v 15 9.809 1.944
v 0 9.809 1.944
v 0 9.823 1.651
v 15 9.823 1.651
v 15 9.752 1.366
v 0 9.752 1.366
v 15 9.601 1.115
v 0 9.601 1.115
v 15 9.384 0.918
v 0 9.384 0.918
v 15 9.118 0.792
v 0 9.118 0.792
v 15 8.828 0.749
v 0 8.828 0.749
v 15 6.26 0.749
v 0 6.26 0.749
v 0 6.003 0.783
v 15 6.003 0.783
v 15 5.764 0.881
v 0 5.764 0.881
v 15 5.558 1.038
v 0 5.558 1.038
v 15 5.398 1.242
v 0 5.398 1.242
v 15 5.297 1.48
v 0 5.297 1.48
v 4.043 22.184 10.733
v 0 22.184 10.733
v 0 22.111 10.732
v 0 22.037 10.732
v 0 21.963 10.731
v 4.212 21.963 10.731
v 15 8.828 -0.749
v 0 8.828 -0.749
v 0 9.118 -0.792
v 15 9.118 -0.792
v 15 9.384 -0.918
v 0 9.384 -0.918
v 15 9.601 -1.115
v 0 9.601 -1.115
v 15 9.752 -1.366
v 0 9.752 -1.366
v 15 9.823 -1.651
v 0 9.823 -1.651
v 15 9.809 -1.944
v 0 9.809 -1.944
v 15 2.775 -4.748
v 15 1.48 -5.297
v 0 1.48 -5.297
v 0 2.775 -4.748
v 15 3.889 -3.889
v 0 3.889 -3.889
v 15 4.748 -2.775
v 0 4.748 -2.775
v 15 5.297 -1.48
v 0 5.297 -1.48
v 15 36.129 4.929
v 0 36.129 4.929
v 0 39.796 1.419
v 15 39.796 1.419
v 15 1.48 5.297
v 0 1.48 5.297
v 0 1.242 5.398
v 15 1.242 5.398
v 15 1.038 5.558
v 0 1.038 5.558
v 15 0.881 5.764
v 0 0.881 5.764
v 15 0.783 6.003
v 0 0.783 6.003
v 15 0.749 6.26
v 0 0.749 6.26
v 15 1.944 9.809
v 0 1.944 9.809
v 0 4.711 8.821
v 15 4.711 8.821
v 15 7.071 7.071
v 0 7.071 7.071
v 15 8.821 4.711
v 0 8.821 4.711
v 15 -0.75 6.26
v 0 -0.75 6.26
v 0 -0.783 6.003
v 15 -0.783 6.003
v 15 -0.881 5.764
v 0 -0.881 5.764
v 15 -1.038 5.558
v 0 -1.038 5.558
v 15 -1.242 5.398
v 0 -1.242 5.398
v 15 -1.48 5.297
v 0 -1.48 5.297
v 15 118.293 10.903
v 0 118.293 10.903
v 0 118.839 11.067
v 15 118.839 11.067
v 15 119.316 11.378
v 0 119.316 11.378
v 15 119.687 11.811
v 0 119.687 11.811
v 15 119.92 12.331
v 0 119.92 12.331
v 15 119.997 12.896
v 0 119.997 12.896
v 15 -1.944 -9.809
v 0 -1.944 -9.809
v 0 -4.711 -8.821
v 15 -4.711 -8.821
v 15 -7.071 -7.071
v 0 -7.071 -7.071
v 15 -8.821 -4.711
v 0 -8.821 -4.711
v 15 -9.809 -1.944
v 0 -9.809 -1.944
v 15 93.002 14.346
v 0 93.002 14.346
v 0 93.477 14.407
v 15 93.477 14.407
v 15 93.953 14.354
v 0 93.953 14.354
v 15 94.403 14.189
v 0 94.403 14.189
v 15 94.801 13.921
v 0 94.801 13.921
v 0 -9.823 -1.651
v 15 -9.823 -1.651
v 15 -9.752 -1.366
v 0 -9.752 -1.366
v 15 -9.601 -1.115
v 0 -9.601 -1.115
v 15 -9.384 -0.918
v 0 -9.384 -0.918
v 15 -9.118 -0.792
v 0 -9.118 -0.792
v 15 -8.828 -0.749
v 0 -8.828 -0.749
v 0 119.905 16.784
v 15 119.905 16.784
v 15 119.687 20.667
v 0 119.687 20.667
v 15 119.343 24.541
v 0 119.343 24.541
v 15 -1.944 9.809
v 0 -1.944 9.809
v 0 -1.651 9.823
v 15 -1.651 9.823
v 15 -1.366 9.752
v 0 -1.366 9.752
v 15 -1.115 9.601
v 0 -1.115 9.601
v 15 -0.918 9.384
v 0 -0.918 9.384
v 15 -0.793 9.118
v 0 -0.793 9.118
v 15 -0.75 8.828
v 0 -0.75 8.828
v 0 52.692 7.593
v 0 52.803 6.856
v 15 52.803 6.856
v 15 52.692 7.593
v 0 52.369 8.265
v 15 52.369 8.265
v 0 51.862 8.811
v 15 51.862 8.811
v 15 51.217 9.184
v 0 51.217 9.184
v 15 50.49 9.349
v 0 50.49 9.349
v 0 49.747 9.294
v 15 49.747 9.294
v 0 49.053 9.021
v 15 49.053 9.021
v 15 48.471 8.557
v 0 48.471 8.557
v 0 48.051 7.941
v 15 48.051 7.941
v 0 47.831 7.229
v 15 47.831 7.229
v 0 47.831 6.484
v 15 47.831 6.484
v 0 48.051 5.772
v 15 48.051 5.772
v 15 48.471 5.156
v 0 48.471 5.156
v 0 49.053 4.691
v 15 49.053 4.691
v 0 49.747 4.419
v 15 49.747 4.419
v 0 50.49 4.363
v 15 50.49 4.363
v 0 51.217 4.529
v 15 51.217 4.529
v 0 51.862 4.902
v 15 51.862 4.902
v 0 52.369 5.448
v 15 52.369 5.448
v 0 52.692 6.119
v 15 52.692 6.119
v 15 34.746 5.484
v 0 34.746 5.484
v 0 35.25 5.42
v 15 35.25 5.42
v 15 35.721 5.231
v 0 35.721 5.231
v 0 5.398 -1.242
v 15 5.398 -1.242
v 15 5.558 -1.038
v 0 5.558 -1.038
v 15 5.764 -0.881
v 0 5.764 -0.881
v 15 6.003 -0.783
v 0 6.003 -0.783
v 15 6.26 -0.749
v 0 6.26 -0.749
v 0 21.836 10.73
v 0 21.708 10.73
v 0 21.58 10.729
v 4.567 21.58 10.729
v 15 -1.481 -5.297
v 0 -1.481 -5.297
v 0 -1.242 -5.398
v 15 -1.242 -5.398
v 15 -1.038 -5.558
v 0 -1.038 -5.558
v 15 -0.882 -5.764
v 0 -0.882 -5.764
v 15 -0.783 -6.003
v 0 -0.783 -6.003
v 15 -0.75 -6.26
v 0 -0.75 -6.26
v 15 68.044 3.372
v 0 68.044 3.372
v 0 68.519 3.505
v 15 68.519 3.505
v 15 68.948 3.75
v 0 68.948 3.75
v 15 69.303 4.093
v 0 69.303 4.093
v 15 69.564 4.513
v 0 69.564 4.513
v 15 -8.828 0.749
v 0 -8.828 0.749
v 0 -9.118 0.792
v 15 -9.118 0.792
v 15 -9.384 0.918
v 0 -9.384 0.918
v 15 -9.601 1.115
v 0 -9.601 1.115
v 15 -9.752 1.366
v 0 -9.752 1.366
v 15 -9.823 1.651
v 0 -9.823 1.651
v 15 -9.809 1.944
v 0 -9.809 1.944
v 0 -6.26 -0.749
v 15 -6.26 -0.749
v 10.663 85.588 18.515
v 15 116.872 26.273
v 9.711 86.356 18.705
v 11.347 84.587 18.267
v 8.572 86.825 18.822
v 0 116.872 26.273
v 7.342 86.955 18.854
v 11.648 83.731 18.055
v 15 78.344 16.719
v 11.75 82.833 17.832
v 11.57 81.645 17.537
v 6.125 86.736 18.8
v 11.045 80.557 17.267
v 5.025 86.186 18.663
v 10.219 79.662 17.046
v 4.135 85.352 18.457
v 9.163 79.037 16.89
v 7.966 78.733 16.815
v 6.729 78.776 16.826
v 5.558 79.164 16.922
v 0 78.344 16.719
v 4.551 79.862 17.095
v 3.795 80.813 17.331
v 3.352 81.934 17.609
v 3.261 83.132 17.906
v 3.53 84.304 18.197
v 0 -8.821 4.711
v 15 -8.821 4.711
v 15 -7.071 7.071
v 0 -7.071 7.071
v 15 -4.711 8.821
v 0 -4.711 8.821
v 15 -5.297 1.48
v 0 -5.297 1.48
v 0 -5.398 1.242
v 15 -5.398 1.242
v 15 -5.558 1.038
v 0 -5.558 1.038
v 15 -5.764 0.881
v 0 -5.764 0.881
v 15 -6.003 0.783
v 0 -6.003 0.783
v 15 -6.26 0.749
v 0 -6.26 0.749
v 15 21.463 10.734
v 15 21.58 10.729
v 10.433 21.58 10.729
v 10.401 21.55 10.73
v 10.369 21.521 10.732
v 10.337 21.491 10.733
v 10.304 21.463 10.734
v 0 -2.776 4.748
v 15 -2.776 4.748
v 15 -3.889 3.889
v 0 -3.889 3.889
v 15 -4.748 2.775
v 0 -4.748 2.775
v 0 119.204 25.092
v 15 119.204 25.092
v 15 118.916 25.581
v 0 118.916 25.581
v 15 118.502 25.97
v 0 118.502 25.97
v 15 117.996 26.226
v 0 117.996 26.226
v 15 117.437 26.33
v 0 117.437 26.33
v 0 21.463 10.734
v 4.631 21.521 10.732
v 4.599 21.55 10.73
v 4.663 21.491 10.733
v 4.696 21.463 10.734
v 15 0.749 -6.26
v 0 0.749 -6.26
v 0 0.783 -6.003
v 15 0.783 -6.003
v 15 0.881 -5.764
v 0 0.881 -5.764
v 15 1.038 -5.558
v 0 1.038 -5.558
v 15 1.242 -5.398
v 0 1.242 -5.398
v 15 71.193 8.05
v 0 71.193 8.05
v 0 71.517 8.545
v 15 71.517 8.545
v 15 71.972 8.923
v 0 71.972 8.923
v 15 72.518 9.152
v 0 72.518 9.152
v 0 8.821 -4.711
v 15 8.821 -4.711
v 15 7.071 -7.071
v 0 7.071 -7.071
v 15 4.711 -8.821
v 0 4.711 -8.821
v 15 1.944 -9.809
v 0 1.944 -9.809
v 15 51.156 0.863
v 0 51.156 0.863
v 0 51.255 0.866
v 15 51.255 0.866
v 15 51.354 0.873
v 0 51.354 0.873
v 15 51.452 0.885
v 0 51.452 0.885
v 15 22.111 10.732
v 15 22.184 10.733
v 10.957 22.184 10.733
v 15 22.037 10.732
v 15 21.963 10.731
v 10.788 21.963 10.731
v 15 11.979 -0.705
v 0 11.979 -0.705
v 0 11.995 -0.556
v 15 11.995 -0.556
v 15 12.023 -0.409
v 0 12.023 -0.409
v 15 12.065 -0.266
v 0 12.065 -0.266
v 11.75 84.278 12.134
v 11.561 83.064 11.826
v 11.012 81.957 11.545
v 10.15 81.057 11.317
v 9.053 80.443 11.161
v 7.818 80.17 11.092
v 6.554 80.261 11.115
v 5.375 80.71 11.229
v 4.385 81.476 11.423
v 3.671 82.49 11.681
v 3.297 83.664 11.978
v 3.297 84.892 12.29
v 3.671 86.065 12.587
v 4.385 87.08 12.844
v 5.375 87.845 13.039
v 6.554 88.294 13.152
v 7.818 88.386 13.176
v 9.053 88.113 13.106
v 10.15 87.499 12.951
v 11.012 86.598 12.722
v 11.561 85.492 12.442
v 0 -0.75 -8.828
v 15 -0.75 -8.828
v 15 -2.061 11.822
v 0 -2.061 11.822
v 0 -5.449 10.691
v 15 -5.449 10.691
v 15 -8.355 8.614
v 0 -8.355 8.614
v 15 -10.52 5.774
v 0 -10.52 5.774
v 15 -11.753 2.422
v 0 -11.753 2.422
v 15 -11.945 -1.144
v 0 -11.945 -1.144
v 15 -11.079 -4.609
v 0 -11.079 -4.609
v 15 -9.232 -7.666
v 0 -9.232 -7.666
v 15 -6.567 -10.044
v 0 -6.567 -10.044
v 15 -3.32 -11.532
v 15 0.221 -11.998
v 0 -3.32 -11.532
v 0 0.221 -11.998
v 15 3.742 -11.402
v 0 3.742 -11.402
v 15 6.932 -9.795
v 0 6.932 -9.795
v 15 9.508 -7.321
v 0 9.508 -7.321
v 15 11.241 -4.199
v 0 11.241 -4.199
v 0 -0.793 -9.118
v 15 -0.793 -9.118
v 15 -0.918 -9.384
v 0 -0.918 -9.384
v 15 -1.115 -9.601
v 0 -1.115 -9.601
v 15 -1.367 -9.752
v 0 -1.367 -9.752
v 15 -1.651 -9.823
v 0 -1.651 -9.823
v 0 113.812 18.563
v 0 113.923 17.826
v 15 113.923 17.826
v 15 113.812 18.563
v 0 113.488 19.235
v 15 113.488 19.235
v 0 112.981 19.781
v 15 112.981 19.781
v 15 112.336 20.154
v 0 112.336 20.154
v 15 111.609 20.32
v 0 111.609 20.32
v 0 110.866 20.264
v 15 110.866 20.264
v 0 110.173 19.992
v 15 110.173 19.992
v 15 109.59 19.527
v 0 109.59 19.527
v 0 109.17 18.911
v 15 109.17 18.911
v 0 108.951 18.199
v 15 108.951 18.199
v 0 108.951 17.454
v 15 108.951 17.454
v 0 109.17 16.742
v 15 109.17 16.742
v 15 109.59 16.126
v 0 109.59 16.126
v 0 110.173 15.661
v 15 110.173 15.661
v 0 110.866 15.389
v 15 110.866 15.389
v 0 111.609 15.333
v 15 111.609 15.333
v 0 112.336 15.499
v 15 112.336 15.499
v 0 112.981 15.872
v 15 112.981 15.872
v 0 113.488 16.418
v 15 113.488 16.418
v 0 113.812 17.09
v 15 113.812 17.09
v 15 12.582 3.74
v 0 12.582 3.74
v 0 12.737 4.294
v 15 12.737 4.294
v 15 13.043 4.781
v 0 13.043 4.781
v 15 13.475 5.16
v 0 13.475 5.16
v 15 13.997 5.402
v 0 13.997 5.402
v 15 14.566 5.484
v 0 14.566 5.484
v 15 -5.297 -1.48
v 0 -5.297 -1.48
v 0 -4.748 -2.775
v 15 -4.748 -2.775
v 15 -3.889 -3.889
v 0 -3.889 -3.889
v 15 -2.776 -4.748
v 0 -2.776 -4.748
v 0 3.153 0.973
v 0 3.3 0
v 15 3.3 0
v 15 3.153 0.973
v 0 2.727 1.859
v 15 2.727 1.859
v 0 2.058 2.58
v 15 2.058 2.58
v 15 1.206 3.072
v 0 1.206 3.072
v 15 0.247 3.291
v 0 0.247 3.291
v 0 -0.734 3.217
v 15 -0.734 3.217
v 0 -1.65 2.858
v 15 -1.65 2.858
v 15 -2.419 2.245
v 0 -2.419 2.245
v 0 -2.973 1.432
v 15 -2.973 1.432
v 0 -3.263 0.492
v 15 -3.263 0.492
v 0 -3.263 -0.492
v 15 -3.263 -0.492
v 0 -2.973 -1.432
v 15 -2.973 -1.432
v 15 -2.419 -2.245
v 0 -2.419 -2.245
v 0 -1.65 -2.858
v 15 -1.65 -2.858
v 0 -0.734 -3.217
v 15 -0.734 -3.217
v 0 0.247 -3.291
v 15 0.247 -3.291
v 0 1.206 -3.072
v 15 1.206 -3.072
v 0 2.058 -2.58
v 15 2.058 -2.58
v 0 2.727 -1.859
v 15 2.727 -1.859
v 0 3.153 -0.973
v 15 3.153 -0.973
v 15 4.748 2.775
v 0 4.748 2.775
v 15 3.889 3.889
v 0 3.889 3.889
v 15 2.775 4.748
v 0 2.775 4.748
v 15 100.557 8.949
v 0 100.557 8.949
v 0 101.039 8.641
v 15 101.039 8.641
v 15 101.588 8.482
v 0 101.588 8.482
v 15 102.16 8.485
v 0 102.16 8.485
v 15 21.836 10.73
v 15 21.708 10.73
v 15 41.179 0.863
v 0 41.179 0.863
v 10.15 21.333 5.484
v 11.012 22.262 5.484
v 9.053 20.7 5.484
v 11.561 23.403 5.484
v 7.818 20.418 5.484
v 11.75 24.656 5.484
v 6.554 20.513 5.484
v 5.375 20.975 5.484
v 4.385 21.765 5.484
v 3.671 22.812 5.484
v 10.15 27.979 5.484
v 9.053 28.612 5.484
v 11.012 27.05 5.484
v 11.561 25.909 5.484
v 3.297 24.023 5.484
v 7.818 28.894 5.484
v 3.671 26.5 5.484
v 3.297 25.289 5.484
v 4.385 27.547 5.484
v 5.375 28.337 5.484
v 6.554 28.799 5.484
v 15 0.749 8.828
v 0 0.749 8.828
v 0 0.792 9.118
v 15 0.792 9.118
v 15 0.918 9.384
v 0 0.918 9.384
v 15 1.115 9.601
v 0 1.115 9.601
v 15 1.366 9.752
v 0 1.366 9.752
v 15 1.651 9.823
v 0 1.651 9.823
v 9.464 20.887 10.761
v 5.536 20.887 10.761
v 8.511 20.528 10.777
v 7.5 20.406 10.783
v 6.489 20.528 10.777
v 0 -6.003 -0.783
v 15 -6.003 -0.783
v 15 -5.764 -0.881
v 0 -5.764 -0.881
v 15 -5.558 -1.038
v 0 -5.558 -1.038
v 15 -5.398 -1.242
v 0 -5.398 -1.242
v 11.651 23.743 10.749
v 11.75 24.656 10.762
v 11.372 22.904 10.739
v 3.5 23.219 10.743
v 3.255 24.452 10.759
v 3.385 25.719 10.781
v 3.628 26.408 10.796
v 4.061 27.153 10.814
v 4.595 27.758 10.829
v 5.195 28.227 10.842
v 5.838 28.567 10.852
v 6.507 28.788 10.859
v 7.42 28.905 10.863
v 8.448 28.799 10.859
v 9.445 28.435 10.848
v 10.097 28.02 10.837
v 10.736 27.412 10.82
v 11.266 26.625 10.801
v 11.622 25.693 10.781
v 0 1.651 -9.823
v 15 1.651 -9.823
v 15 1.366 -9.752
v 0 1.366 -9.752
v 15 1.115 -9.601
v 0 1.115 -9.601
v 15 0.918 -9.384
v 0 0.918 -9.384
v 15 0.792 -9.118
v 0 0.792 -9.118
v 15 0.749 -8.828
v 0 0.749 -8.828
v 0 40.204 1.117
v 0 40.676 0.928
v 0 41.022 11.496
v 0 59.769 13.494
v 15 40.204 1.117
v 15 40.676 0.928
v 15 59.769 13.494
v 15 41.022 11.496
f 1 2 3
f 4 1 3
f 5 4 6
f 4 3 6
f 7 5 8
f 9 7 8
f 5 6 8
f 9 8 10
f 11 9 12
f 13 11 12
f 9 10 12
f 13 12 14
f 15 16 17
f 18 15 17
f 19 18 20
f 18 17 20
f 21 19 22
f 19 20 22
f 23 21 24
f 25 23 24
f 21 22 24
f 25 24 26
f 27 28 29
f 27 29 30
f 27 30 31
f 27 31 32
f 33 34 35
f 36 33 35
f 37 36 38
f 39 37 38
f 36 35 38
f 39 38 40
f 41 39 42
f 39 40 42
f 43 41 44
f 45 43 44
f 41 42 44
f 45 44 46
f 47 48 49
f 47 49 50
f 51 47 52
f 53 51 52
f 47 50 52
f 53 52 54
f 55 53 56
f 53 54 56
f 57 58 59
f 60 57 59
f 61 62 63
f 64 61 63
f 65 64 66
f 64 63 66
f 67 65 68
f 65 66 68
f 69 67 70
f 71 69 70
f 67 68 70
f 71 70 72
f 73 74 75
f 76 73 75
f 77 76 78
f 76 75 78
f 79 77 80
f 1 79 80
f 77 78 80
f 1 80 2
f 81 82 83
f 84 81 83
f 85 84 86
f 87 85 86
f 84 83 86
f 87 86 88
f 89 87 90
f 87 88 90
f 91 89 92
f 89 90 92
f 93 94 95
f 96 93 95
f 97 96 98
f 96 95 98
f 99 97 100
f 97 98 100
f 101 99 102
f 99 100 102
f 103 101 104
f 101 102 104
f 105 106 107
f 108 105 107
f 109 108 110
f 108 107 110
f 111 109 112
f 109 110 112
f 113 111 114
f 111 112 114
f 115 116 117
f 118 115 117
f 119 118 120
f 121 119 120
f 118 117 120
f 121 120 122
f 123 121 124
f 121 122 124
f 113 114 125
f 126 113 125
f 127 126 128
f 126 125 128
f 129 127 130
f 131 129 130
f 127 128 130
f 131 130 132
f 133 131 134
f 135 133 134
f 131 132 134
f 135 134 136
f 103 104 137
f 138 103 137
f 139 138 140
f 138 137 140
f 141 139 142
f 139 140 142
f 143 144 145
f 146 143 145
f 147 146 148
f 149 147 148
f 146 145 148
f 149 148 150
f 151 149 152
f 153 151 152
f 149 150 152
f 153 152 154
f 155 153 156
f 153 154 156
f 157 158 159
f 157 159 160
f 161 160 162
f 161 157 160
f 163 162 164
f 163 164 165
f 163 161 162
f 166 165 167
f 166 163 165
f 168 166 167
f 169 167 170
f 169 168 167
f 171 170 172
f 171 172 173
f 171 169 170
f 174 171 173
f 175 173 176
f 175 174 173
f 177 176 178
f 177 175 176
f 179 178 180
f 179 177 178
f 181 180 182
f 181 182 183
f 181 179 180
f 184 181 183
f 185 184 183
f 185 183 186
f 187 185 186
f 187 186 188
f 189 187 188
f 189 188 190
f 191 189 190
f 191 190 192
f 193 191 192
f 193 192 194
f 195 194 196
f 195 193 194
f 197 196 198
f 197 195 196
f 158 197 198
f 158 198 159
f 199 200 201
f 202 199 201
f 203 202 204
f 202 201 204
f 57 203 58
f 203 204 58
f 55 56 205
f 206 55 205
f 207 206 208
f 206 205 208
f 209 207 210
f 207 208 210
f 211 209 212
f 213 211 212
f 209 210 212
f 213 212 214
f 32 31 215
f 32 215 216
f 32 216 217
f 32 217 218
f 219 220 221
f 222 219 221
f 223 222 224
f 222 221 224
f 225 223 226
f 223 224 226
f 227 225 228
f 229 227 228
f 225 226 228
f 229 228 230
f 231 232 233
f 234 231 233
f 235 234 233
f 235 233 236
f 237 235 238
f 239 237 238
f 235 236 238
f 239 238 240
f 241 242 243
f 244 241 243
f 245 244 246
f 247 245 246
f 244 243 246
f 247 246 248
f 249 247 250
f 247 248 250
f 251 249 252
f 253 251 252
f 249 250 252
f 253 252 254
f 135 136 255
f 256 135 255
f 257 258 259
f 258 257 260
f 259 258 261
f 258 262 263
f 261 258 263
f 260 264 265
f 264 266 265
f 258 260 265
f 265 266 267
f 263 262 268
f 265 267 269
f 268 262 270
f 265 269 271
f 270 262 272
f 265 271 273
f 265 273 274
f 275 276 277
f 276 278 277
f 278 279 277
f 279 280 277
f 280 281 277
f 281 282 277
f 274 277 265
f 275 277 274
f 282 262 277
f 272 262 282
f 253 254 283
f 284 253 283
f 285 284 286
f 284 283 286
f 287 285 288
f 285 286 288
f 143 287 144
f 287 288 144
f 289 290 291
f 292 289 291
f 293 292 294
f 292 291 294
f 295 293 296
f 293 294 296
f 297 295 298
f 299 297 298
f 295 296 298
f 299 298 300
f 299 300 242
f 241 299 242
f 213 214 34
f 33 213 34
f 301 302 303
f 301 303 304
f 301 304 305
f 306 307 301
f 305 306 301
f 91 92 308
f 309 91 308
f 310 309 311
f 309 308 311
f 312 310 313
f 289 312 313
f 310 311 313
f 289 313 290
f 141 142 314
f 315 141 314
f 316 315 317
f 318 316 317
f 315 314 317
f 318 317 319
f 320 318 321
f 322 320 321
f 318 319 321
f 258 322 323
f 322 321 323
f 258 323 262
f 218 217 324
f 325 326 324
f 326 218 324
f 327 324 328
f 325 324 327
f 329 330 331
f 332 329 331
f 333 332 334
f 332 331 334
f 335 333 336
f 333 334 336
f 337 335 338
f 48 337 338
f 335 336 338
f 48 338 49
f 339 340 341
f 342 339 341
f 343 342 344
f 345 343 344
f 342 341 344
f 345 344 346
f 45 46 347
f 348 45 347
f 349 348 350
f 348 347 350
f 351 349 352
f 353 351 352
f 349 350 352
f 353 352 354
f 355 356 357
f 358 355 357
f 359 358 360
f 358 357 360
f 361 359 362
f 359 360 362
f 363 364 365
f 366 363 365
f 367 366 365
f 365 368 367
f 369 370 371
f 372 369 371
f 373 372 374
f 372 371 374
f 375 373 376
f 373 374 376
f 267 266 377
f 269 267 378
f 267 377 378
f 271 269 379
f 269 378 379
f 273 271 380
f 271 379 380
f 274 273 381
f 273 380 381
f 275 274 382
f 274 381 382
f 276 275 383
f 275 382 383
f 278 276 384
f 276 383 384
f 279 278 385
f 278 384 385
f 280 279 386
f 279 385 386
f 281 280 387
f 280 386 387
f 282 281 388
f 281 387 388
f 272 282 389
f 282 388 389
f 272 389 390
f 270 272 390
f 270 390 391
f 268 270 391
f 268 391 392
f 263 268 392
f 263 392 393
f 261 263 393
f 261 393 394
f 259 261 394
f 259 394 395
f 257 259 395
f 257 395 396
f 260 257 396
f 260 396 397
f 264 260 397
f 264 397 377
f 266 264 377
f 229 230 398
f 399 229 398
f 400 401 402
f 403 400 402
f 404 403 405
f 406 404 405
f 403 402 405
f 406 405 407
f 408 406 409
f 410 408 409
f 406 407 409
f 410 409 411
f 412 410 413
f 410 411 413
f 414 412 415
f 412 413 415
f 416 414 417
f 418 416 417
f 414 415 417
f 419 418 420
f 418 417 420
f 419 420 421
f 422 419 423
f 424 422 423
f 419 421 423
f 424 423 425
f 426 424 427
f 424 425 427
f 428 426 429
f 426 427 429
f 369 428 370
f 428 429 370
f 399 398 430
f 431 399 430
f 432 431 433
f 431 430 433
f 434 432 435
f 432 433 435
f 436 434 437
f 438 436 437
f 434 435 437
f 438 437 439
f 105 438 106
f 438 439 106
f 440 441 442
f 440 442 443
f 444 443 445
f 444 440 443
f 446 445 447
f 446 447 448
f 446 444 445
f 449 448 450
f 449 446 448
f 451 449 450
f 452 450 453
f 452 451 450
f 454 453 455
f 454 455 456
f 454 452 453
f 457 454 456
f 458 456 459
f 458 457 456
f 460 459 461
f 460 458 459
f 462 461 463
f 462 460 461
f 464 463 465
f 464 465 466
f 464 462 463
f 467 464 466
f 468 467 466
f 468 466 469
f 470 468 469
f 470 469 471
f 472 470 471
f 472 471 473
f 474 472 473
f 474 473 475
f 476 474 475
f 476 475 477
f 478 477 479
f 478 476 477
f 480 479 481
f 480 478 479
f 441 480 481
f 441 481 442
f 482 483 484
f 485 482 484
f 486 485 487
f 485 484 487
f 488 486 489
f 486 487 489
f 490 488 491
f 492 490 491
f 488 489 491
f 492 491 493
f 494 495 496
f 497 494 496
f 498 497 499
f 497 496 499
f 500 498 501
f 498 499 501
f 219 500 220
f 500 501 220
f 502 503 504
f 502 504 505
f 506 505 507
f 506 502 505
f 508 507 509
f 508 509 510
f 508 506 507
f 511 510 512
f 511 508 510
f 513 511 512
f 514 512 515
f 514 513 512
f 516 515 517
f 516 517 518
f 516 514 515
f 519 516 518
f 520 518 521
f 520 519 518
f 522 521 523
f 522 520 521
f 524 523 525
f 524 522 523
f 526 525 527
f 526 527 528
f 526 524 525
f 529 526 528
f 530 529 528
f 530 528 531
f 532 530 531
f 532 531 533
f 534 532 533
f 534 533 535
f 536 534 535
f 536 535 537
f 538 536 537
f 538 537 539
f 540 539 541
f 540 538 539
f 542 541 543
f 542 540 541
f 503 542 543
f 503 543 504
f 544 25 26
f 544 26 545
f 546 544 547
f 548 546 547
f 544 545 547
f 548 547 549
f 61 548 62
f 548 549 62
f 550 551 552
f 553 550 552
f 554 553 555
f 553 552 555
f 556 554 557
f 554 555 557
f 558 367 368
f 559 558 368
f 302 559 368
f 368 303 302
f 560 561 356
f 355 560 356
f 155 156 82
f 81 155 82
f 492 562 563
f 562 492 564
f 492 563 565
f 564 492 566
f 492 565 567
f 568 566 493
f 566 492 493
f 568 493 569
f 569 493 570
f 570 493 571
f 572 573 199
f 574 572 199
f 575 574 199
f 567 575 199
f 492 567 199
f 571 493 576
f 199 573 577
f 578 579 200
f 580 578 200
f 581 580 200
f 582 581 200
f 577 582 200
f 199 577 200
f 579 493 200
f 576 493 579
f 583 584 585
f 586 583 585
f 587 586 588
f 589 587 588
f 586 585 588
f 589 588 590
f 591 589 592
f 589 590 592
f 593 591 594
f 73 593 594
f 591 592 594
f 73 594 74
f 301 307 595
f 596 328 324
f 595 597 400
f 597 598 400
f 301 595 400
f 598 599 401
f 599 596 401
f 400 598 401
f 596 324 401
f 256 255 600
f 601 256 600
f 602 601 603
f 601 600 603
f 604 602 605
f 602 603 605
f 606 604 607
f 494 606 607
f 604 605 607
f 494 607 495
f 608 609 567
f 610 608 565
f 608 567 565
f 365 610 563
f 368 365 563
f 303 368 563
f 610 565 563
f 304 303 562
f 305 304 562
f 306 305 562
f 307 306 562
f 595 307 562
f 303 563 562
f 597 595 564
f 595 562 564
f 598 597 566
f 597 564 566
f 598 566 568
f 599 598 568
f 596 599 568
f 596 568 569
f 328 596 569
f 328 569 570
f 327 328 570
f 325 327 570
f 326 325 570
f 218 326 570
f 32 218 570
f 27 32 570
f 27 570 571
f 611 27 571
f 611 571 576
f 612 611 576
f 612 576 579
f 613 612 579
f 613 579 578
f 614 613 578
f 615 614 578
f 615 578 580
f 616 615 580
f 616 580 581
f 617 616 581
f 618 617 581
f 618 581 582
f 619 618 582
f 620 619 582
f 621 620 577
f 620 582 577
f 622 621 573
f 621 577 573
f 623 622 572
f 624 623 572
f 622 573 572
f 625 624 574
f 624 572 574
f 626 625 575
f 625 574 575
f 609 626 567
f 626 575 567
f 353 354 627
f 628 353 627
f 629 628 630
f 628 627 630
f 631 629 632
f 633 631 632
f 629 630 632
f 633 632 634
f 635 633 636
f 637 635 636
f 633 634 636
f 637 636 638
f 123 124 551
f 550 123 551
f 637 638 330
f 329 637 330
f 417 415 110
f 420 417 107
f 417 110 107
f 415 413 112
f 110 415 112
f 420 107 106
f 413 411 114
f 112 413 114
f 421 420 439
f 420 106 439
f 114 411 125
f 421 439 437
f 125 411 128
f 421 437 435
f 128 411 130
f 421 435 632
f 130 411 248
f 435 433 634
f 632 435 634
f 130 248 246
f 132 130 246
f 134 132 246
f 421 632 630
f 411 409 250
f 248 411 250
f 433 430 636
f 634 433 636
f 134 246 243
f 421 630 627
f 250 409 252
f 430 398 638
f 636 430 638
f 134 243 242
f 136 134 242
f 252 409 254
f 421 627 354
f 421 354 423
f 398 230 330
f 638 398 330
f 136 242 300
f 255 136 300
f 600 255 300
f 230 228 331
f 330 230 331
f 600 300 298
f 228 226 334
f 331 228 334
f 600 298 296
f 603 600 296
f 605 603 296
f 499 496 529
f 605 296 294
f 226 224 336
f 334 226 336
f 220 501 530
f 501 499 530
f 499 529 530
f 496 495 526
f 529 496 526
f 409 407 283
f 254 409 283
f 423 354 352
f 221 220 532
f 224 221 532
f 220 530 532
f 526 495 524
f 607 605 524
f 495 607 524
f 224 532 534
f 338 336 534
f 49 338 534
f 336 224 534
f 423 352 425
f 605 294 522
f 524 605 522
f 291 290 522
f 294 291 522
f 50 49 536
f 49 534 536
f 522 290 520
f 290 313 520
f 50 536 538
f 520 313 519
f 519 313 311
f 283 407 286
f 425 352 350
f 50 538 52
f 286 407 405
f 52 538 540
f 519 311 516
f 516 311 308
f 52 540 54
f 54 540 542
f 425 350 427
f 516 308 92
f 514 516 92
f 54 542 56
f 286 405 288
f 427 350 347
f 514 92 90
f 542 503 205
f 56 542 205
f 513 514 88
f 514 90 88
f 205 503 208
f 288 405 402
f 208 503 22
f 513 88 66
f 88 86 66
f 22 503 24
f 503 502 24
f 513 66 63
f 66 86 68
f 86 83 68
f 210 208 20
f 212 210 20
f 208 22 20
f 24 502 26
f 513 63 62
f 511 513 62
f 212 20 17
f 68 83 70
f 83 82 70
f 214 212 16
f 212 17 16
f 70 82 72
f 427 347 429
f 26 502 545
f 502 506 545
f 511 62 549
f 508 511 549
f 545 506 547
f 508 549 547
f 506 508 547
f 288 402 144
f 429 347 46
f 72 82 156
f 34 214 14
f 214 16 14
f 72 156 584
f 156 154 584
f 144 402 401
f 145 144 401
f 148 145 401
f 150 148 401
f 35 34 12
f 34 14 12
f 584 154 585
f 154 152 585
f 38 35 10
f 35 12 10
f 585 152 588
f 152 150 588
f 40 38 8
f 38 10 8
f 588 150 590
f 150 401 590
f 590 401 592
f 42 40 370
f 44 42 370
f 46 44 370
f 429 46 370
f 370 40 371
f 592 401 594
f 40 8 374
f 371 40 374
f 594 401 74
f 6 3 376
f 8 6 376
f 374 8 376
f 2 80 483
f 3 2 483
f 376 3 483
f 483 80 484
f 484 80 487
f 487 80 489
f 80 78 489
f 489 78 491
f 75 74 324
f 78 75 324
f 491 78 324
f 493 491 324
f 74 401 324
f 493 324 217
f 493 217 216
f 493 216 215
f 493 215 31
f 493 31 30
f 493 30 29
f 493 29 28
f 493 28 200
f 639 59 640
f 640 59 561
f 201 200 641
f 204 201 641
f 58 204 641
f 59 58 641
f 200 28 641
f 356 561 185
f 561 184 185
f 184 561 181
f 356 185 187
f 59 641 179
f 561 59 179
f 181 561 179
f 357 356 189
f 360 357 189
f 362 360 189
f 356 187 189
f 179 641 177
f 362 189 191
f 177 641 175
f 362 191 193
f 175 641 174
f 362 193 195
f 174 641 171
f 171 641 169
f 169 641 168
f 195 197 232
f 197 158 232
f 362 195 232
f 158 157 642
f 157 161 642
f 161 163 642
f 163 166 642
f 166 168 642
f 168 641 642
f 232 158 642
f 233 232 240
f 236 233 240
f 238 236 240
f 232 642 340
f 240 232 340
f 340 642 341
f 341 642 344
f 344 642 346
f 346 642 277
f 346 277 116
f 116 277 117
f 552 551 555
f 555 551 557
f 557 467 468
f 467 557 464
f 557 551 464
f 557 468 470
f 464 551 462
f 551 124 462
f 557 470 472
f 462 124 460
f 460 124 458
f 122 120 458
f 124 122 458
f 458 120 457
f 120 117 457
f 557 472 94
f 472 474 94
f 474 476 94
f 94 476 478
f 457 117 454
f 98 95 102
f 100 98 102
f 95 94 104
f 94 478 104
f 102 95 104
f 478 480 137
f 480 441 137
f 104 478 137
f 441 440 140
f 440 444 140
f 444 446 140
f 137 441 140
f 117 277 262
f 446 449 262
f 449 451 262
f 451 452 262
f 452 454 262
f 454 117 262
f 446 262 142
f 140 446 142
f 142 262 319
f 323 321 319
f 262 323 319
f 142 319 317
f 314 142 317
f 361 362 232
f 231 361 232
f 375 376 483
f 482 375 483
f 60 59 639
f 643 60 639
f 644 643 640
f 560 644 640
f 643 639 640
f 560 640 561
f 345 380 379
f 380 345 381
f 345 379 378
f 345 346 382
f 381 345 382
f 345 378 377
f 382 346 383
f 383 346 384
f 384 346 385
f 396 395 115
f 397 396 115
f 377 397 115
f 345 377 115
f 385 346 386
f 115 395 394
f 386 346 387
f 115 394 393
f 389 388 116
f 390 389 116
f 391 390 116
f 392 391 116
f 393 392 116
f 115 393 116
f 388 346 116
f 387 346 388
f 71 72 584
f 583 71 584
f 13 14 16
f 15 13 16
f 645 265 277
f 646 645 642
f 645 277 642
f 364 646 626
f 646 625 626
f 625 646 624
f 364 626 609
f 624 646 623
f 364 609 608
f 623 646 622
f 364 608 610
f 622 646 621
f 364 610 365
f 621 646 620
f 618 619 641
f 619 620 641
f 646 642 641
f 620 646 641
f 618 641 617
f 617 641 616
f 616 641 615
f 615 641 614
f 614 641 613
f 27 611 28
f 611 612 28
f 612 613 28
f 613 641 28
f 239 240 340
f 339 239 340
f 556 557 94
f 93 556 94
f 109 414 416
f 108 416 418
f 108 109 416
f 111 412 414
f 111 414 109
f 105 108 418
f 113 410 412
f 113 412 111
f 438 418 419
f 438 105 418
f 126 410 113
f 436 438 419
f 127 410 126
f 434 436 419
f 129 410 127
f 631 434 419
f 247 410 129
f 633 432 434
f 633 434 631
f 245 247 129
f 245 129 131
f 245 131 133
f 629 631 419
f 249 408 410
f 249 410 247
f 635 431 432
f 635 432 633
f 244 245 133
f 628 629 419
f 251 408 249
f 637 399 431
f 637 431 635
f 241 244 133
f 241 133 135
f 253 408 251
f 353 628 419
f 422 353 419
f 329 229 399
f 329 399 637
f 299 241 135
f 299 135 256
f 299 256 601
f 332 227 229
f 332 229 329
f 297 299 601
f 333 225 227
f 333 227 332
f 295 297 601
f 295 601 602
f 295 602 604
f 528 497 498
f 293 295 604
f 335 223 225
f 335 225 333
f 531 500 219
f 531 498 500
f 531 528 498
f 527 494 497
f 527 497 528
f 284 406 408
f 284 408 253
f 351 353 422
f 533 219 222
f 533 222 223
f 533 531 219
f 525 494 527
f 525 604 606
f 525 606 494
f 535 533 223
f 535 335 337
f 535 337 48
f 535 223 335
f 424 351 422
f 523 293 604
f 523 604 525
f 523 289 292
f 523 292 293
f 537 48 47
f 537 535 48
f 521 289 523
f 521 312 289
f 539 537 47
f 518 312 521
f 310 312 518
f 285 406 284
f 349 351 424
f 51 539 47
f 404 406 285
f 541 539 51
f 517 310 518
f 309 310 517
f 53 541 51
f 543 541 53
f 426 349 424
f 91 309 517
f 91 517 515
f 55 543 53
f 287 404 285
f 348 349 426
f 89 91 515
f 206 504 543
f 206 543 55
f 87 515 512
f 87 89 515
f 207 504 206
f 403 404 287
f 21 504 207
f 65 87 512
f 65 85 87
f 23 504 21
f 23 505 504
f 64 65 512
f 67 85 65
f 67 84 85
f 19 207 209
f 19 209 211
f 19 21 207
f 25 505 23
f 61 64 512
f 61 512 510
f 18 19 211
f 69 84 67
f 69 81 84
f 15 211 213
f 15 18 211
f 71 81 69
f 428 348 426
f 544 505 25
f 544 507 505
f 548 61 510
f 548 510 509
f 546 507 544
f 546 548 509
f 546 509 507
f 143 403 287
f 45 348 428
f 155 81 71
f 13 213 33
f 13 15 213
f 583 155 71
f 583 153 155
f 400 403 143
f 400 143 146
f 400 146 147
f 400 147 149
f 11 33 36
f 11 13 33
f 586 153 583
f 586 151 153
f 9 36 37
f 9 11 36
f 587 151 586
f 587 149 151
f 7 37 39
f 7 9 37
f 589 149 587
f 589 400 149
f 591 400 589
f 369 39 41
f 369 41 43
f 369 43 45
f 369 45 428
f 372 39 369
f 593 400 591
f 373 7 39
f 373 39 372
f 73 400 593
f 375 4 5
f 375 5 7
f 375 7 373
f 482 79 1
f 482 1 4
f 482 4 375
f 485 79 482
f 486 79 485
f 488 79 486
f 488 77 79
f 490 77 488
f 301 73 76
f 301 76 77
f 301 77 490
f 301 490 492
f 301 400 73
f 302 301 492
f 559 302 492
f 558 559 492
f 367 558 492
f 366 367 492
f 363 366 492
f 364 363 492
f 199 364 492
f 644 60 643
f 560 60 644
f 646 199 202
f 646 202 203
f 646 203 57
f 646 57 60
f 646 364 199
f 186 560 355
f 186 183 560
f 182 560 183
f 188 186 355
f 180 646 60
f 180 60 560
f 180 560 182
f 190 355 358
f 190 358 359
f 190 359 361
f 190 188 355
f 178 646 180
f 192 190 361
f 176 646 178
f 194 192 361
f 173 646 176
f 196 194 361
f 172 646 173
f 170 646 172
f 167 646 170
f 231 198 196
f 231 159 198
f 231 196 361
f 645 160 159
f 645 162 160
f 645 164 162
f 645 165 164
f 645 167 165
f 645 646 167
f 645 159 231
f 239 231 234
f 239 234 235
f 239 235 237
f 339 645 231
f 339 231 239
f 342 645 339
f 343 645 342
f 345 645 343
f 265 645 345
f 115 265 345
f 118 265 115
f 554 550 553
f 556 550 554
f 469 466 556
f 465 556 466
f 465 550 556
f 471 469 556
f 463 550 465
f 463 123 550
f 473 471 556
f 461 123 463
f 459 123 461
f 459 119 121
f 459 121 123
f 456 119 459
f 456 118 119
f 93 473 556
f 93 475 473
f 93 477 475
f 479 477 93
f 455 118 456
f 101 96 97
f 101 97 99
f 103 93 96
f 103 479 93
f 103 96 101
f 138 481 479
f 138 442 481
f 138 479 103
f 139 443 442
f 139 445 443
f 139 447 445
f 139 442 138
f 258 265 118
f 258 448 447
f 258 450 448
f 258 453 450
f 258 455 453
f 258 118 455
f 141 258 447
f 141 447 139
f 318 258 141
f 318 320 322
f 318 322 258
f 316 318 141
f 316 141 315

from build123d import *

# Parameters (mm, degrees)
F0_R     = 3.3
F0_R_2   = 2.5
F1_DEPTH = 15
F2_R     = 4.25
F3_DEPTH = 7.6
F4_R     = 4.25
F5_DEPTH = 15.8


# Not quite as in the source:
# - a feature names something its author has since deleted; it is built from what else it names


with BuildPart() as f1:
    # F0 (on Right) → F1 (new body)
    with BuildSketch(Plane.YZ):
        with BuildLine():
            ThreePointArc((21.8315579223, 10.717182122), (21.897134346, 10.7177196915), (21.9626931438, 10.7193322557))
            ThreePointArc((21.9626931438, 10.7193322557), (21.9630378123, 10.7252568669), (21.9633808826, 10.731181571))
            ThreePointArc((21.9633808826, 10.731181571), (21.7716697335, 10.7299327404), (21.5799577929, 10.728811993))
            Line((21.5799577929, 10.728811993), (21.8315579223, 10.717182122))
        make_face()
        with BuildLine():
            ThreePointArc((22.1844688263, 10.7327808001), (22.0736743793, 10.7245163933), (21.9626931438, 10.7193322557))
            ThreePointArc((21.9626931438, 10.7193322557), (21.897134346, 10.7177196915), (21.8315579223, 10.717182122))
            ThreePointArc((21.8315579223, 10.717182122), (21.6468606164, 10.7214485341), (21.4625573078, 10.7342386694))
            Line((21.4625573078, 10.7342386694), (-2.0614712889, 11.8216046341))
            ThreePointArc((-2.0614712889, 11.8216046341), (-7.9885695505, -8.9544824829), (11.9792964571, -0.7045966171))
            ThreePointArc((11.9792964571, -0.7045966171), (12.0074816864, -0.4822378377), (12.0652655082, -0.2656763826))
            Line((12.0652655082, -0.2656763826), (12.5823545671, 3.7402298466))
            ThreePointArc((12.5823545671, 3.7402298466), (13.2453067327, 4.9862024463), (14.565897859, 5.4841907695))
            Line((14.565897859, 5.4841907695), (34.746018001, 5.4841907695))
            ThreePointArc((34.746018001, 5.4841907695), (35.4911723527, 5.3401931919), (36.1290262829, 4.9289357615))
            Line((36.1290262829, 4.9289357615), (39.7961525429, 1.4185128035))
            ThreePointArc((39.7961525429, 1.4185128035), (40.4340064731, 1.0072553731), (41.1791608249, 0.8632577956))
            Line((41.1791608249, 0.8632577956), (51.1560065331, 0.8632577956))
            ThreePointArc((51.1560065331, 0.8632577956), (51.3046360431, 0.8687881245), (51.452443583, 0.8853485268))
            Line((51.452443583, 0.8853485268), (68.043755982, 3.3719538424))
            ThreePointArc((68.043755982, 3.3719538424), (68.9480745213, 3.750430082), (69.5639006382, 4.5131846154))
            Line((69.5639006382, 4.5131846154), (71.1927053136, 8.0496168184))
            ThreePointArc((71.1927053136, 8.0496168184), (71.7304115705, 8.7506241115), (72.5176709464, 9.151575379))
            Line((72.5176709464, 9.151575379), (93.0016589096, 14.3460792675))
            ThreePointArc((93.0016589096, 14.3460792675), (93.9531599103, 14.3538506609), (94.800564285, 13.9210454222))
            Line((94.800564285, 13.9210454222), (100.5567479715, 8.9494668086))
            ThreePointArc((100.5567479715, 8.9494668086), (101.3078443235, 8.5419637232), (102.1604743235, 8.4851607509))
            Line((102.1604743235, 8.4851607509), (118.2931486533, 10.9030281733))
            ThreePointArc((118.2931486533, 10.9030281733), (119.516973098, 11.5813971433), (119.9966558679, 12.8958685851))
            ThreePointArc((119.9966558679, 12.8958685851), (119.8113324935, 18.7264110882), (119.3428752162, 24.5410579746))
            ThreePointArc((119.3428752162, 24.5410579746), (118.5020303548, 25.9696085801), (116.872434029, 26.2732411356))
            Line((116.872434029, 26.2732411356), (78.344444671, 16.7187866332))
            ThreePointArc((78.344444671, 16.7187866332), (50.4120849121, 12.3407543123), (22.1844688263, 10.7327808001))
        make_face()
        with BuildLine():
            ThreePointArc((-9.8092514957, -1.9438583008), (-9.6011089256, -1.114801623), (-8.8283263462, -0.7494724707))
            Line((-8.8283263462, -0.7494724707), (-6.2601394612, -0.7494724707))
            ThreePointArc((-6.2601394612, -0.7494724707), (-5.6556353715, -0.9528704337), (-5.2970410826, -1.4803228598))
            ThreePointArc((-5.2970410826, -1.4803228598), (-3.8892204731, -3.8889541154), (-1.4806856428, -5.2969396851))
            ThreePointArc((-1.4806856428, -5.2969396851), (-0.9532704937, -5.6555533383), (-0.7499012145, -6.2600460414))
            Line((-0.7499012145, -6.2600460414), (-0.7499690502, -8.8282543402))
            ThreePointArc((-0.7499690502, -8.8282543402), (-1.1153301427, -9.6010367371), (-1.9444100554, -9.8091421407))
            ThreePointArc((-1.9444100554, -9.8091421407), (-7.0712666783, -7.0708689399), (-9.8092514957, -1.9438583008))
        make_face(mode=Mode.SUBTRACT)
        with BuildLine():
            ThreePointArc((9.8092514957, -1.9438583008), (7.0710678119, -7.0710678119), (1.9438583008, -9.8092514957))
            ThreePointArc((1.9438583008, -9.8092514957), (1.114801623, -9.6011089256), (0.7494724707, -8.8283263462))
            Line((0.7494724707, -8.8283263462), (0.7494724707, -6.2601394612))
            ThreePointArc((0.7494724707, -6.2601394612), (0.9528704337, -5.6556353715), (1.4803228598, -5.2970410826))
            ThreePointArc((1.4803228598, -5.2970410826), (3.8890872965, -3.8890872965), (5.2970410826, -1.4803228598))
            ThreePointArc((5.2970410826, -1.4803228598), (5.6556353715, -0.9528704337), (6.2601394612, -0.7494724707))
            Line((6.2601394612, -0.7494724707), (8.8283263462, -0.7494724707))
            ThreePointArc((8.8283263462, -0.7494724707), (9.6011089256, -1.114801623), (9.8092514957, -1.9438583008))
        make_face(mode=Mode.SUBTRACT)
        Circle(F0_R, mode=Mode.SUBTRACT)
        with BuildLine():
            Line((-6.2601394612, 0.7494724707), (-8.8283263462, 0.7494724707))
            ThreePointArc((-8.8283263462, 0.7494724707), (-9.6011089256, 1.114801623), (-9.8092514957, 1.9438583008))
            ThreePointArc((-9.8092514957, 1.9438583008), (-7.0710799085, 7.0710557152), (-1.9438918628, 9.8092448448))
            ThreePointArc((-1.9438918628, 9.8092448448), (-1.1148229448, 9.6010956435), (-0.7495026768, 8.8282939467))
            Line((-0.7495026768, 8.8282939467), (-0.7495705125, 6.2600856479))
            ThreePointArc((-0.7495705125, 6.2600856479), (-0.9529717251, 5.6556036891), (-1.480405818, 5.2970178982))
            ThreePointArc((-1.480405818, 5.2970178982), (-3.8891177504, 3.8890568424), (-5.2970410826, 1.4803228598))
            ThreePointArc((-5.2970410826, 1.4803228598), (-5.6556353715, 0.9528704337), (-6.2601394612, 0.7494724707))
        make_face(mode=Mode.SUBTRACT)
        with BuildLine():
            Line((0.7494724707, 6.2601394612), (0.7494724707, 8.8283263462))
            ThreePointArc((0.7494724707, 8.8283263462), (1.114801623, 9.6011089256), (1.9438583008, 9.8092514957))
            ThreePointArc((1.9438583008, 9.8092514957), (7.0710678119, 7.0710678119), (9.8092514957, 1.9438583008))
            ThreePointArc((9.8092514957, 1.9438583008), (9.6011089256, 1.114801623), (8.8283263462, 0.7494724707))
            Line((8.8283263462, 0.7494724707), (6.2601394612, 0.7494724707))
            ThreePointArc((6.2601394612, 0.7494724707), (5.6556353715, 0.9528704337), (5.2970410826, 1.4803228598))
            ThreePointArc((5.2970410826, 1.4803228598), (3.8890872965, 3.8890872965), (1.4803228598, 5.2970410826))
            ThreePointArc((1.4803228598, 5.2970410826), (0.9528704337, 5.6556353715), (0.7494724707, 6.2601394612))
        make_face(mode=Mode.SUBTRACT)
        with Locations((50.3031872213, 6.8563437089)):
            Circle(F0_R_2, mode=Mode.SUBTRACT)
        with Locations((111.4225909114, 17.8264938295)):
            Circle(F0_R_2, mode=Mode.SUBTRACT)
        with BuildLine():
            ThreePointArc((21.9633808826, 10.731181571), (21.9630378123, 10.7252568669), (21.9626931438, 10.7193322557))
            ThreePointArc((21.9626931438, 10.7193322557), (22.0736743793, 10.7245163933), (22.1844688263, 10.7327808001))
            ThreePointArc((22.1844688263, 10.7327808001), (22.0739250085, 10.7319598925), (21.9633808826, 10.731181571))
        make_face()
        with BuildLine():
            ThreePointArc((21.4625573078, 10.7342386694), (21.6468606164, 10.7214485341), (21.8315579223, 10.717182122))
            Line((21.8315579223, 10.717182122), (21.5799577929, 10.728811993))
            Line((21.5799577929, 10.728811993), (21.4625573078, 10.7342386694))
        make_face()
    extrude(amount=F1_DEPTH)

    # F2 (on face) → F3 (cut)
    with BuildSketch(Plane(origin=(0, 0, 5.4841907695), x_dir=(1, 0, 0), z_dir=(0, 0, -1))):
        with Locations((7.5, -24.65595793)):
            Circle(F2_R)
    extrude(amount=-F3_DEPTH, mode=Mode.SUBTRACT)

    # F4 (on face) → F5 (cut)
    with BuildSketch(Plane(origin=(0, 2.2011211845, -8.6798933673), x_dir=(1, 0, 0), z_dir=(0, 0.2458080366, -0.9693185282))):
        with Locations((7.5, -84.6746127131)):
            Circle(F4_R)
    extrude(amount=-F5_DEPTH, mode=Mode.SUBTRACT)


solid = f1.part
